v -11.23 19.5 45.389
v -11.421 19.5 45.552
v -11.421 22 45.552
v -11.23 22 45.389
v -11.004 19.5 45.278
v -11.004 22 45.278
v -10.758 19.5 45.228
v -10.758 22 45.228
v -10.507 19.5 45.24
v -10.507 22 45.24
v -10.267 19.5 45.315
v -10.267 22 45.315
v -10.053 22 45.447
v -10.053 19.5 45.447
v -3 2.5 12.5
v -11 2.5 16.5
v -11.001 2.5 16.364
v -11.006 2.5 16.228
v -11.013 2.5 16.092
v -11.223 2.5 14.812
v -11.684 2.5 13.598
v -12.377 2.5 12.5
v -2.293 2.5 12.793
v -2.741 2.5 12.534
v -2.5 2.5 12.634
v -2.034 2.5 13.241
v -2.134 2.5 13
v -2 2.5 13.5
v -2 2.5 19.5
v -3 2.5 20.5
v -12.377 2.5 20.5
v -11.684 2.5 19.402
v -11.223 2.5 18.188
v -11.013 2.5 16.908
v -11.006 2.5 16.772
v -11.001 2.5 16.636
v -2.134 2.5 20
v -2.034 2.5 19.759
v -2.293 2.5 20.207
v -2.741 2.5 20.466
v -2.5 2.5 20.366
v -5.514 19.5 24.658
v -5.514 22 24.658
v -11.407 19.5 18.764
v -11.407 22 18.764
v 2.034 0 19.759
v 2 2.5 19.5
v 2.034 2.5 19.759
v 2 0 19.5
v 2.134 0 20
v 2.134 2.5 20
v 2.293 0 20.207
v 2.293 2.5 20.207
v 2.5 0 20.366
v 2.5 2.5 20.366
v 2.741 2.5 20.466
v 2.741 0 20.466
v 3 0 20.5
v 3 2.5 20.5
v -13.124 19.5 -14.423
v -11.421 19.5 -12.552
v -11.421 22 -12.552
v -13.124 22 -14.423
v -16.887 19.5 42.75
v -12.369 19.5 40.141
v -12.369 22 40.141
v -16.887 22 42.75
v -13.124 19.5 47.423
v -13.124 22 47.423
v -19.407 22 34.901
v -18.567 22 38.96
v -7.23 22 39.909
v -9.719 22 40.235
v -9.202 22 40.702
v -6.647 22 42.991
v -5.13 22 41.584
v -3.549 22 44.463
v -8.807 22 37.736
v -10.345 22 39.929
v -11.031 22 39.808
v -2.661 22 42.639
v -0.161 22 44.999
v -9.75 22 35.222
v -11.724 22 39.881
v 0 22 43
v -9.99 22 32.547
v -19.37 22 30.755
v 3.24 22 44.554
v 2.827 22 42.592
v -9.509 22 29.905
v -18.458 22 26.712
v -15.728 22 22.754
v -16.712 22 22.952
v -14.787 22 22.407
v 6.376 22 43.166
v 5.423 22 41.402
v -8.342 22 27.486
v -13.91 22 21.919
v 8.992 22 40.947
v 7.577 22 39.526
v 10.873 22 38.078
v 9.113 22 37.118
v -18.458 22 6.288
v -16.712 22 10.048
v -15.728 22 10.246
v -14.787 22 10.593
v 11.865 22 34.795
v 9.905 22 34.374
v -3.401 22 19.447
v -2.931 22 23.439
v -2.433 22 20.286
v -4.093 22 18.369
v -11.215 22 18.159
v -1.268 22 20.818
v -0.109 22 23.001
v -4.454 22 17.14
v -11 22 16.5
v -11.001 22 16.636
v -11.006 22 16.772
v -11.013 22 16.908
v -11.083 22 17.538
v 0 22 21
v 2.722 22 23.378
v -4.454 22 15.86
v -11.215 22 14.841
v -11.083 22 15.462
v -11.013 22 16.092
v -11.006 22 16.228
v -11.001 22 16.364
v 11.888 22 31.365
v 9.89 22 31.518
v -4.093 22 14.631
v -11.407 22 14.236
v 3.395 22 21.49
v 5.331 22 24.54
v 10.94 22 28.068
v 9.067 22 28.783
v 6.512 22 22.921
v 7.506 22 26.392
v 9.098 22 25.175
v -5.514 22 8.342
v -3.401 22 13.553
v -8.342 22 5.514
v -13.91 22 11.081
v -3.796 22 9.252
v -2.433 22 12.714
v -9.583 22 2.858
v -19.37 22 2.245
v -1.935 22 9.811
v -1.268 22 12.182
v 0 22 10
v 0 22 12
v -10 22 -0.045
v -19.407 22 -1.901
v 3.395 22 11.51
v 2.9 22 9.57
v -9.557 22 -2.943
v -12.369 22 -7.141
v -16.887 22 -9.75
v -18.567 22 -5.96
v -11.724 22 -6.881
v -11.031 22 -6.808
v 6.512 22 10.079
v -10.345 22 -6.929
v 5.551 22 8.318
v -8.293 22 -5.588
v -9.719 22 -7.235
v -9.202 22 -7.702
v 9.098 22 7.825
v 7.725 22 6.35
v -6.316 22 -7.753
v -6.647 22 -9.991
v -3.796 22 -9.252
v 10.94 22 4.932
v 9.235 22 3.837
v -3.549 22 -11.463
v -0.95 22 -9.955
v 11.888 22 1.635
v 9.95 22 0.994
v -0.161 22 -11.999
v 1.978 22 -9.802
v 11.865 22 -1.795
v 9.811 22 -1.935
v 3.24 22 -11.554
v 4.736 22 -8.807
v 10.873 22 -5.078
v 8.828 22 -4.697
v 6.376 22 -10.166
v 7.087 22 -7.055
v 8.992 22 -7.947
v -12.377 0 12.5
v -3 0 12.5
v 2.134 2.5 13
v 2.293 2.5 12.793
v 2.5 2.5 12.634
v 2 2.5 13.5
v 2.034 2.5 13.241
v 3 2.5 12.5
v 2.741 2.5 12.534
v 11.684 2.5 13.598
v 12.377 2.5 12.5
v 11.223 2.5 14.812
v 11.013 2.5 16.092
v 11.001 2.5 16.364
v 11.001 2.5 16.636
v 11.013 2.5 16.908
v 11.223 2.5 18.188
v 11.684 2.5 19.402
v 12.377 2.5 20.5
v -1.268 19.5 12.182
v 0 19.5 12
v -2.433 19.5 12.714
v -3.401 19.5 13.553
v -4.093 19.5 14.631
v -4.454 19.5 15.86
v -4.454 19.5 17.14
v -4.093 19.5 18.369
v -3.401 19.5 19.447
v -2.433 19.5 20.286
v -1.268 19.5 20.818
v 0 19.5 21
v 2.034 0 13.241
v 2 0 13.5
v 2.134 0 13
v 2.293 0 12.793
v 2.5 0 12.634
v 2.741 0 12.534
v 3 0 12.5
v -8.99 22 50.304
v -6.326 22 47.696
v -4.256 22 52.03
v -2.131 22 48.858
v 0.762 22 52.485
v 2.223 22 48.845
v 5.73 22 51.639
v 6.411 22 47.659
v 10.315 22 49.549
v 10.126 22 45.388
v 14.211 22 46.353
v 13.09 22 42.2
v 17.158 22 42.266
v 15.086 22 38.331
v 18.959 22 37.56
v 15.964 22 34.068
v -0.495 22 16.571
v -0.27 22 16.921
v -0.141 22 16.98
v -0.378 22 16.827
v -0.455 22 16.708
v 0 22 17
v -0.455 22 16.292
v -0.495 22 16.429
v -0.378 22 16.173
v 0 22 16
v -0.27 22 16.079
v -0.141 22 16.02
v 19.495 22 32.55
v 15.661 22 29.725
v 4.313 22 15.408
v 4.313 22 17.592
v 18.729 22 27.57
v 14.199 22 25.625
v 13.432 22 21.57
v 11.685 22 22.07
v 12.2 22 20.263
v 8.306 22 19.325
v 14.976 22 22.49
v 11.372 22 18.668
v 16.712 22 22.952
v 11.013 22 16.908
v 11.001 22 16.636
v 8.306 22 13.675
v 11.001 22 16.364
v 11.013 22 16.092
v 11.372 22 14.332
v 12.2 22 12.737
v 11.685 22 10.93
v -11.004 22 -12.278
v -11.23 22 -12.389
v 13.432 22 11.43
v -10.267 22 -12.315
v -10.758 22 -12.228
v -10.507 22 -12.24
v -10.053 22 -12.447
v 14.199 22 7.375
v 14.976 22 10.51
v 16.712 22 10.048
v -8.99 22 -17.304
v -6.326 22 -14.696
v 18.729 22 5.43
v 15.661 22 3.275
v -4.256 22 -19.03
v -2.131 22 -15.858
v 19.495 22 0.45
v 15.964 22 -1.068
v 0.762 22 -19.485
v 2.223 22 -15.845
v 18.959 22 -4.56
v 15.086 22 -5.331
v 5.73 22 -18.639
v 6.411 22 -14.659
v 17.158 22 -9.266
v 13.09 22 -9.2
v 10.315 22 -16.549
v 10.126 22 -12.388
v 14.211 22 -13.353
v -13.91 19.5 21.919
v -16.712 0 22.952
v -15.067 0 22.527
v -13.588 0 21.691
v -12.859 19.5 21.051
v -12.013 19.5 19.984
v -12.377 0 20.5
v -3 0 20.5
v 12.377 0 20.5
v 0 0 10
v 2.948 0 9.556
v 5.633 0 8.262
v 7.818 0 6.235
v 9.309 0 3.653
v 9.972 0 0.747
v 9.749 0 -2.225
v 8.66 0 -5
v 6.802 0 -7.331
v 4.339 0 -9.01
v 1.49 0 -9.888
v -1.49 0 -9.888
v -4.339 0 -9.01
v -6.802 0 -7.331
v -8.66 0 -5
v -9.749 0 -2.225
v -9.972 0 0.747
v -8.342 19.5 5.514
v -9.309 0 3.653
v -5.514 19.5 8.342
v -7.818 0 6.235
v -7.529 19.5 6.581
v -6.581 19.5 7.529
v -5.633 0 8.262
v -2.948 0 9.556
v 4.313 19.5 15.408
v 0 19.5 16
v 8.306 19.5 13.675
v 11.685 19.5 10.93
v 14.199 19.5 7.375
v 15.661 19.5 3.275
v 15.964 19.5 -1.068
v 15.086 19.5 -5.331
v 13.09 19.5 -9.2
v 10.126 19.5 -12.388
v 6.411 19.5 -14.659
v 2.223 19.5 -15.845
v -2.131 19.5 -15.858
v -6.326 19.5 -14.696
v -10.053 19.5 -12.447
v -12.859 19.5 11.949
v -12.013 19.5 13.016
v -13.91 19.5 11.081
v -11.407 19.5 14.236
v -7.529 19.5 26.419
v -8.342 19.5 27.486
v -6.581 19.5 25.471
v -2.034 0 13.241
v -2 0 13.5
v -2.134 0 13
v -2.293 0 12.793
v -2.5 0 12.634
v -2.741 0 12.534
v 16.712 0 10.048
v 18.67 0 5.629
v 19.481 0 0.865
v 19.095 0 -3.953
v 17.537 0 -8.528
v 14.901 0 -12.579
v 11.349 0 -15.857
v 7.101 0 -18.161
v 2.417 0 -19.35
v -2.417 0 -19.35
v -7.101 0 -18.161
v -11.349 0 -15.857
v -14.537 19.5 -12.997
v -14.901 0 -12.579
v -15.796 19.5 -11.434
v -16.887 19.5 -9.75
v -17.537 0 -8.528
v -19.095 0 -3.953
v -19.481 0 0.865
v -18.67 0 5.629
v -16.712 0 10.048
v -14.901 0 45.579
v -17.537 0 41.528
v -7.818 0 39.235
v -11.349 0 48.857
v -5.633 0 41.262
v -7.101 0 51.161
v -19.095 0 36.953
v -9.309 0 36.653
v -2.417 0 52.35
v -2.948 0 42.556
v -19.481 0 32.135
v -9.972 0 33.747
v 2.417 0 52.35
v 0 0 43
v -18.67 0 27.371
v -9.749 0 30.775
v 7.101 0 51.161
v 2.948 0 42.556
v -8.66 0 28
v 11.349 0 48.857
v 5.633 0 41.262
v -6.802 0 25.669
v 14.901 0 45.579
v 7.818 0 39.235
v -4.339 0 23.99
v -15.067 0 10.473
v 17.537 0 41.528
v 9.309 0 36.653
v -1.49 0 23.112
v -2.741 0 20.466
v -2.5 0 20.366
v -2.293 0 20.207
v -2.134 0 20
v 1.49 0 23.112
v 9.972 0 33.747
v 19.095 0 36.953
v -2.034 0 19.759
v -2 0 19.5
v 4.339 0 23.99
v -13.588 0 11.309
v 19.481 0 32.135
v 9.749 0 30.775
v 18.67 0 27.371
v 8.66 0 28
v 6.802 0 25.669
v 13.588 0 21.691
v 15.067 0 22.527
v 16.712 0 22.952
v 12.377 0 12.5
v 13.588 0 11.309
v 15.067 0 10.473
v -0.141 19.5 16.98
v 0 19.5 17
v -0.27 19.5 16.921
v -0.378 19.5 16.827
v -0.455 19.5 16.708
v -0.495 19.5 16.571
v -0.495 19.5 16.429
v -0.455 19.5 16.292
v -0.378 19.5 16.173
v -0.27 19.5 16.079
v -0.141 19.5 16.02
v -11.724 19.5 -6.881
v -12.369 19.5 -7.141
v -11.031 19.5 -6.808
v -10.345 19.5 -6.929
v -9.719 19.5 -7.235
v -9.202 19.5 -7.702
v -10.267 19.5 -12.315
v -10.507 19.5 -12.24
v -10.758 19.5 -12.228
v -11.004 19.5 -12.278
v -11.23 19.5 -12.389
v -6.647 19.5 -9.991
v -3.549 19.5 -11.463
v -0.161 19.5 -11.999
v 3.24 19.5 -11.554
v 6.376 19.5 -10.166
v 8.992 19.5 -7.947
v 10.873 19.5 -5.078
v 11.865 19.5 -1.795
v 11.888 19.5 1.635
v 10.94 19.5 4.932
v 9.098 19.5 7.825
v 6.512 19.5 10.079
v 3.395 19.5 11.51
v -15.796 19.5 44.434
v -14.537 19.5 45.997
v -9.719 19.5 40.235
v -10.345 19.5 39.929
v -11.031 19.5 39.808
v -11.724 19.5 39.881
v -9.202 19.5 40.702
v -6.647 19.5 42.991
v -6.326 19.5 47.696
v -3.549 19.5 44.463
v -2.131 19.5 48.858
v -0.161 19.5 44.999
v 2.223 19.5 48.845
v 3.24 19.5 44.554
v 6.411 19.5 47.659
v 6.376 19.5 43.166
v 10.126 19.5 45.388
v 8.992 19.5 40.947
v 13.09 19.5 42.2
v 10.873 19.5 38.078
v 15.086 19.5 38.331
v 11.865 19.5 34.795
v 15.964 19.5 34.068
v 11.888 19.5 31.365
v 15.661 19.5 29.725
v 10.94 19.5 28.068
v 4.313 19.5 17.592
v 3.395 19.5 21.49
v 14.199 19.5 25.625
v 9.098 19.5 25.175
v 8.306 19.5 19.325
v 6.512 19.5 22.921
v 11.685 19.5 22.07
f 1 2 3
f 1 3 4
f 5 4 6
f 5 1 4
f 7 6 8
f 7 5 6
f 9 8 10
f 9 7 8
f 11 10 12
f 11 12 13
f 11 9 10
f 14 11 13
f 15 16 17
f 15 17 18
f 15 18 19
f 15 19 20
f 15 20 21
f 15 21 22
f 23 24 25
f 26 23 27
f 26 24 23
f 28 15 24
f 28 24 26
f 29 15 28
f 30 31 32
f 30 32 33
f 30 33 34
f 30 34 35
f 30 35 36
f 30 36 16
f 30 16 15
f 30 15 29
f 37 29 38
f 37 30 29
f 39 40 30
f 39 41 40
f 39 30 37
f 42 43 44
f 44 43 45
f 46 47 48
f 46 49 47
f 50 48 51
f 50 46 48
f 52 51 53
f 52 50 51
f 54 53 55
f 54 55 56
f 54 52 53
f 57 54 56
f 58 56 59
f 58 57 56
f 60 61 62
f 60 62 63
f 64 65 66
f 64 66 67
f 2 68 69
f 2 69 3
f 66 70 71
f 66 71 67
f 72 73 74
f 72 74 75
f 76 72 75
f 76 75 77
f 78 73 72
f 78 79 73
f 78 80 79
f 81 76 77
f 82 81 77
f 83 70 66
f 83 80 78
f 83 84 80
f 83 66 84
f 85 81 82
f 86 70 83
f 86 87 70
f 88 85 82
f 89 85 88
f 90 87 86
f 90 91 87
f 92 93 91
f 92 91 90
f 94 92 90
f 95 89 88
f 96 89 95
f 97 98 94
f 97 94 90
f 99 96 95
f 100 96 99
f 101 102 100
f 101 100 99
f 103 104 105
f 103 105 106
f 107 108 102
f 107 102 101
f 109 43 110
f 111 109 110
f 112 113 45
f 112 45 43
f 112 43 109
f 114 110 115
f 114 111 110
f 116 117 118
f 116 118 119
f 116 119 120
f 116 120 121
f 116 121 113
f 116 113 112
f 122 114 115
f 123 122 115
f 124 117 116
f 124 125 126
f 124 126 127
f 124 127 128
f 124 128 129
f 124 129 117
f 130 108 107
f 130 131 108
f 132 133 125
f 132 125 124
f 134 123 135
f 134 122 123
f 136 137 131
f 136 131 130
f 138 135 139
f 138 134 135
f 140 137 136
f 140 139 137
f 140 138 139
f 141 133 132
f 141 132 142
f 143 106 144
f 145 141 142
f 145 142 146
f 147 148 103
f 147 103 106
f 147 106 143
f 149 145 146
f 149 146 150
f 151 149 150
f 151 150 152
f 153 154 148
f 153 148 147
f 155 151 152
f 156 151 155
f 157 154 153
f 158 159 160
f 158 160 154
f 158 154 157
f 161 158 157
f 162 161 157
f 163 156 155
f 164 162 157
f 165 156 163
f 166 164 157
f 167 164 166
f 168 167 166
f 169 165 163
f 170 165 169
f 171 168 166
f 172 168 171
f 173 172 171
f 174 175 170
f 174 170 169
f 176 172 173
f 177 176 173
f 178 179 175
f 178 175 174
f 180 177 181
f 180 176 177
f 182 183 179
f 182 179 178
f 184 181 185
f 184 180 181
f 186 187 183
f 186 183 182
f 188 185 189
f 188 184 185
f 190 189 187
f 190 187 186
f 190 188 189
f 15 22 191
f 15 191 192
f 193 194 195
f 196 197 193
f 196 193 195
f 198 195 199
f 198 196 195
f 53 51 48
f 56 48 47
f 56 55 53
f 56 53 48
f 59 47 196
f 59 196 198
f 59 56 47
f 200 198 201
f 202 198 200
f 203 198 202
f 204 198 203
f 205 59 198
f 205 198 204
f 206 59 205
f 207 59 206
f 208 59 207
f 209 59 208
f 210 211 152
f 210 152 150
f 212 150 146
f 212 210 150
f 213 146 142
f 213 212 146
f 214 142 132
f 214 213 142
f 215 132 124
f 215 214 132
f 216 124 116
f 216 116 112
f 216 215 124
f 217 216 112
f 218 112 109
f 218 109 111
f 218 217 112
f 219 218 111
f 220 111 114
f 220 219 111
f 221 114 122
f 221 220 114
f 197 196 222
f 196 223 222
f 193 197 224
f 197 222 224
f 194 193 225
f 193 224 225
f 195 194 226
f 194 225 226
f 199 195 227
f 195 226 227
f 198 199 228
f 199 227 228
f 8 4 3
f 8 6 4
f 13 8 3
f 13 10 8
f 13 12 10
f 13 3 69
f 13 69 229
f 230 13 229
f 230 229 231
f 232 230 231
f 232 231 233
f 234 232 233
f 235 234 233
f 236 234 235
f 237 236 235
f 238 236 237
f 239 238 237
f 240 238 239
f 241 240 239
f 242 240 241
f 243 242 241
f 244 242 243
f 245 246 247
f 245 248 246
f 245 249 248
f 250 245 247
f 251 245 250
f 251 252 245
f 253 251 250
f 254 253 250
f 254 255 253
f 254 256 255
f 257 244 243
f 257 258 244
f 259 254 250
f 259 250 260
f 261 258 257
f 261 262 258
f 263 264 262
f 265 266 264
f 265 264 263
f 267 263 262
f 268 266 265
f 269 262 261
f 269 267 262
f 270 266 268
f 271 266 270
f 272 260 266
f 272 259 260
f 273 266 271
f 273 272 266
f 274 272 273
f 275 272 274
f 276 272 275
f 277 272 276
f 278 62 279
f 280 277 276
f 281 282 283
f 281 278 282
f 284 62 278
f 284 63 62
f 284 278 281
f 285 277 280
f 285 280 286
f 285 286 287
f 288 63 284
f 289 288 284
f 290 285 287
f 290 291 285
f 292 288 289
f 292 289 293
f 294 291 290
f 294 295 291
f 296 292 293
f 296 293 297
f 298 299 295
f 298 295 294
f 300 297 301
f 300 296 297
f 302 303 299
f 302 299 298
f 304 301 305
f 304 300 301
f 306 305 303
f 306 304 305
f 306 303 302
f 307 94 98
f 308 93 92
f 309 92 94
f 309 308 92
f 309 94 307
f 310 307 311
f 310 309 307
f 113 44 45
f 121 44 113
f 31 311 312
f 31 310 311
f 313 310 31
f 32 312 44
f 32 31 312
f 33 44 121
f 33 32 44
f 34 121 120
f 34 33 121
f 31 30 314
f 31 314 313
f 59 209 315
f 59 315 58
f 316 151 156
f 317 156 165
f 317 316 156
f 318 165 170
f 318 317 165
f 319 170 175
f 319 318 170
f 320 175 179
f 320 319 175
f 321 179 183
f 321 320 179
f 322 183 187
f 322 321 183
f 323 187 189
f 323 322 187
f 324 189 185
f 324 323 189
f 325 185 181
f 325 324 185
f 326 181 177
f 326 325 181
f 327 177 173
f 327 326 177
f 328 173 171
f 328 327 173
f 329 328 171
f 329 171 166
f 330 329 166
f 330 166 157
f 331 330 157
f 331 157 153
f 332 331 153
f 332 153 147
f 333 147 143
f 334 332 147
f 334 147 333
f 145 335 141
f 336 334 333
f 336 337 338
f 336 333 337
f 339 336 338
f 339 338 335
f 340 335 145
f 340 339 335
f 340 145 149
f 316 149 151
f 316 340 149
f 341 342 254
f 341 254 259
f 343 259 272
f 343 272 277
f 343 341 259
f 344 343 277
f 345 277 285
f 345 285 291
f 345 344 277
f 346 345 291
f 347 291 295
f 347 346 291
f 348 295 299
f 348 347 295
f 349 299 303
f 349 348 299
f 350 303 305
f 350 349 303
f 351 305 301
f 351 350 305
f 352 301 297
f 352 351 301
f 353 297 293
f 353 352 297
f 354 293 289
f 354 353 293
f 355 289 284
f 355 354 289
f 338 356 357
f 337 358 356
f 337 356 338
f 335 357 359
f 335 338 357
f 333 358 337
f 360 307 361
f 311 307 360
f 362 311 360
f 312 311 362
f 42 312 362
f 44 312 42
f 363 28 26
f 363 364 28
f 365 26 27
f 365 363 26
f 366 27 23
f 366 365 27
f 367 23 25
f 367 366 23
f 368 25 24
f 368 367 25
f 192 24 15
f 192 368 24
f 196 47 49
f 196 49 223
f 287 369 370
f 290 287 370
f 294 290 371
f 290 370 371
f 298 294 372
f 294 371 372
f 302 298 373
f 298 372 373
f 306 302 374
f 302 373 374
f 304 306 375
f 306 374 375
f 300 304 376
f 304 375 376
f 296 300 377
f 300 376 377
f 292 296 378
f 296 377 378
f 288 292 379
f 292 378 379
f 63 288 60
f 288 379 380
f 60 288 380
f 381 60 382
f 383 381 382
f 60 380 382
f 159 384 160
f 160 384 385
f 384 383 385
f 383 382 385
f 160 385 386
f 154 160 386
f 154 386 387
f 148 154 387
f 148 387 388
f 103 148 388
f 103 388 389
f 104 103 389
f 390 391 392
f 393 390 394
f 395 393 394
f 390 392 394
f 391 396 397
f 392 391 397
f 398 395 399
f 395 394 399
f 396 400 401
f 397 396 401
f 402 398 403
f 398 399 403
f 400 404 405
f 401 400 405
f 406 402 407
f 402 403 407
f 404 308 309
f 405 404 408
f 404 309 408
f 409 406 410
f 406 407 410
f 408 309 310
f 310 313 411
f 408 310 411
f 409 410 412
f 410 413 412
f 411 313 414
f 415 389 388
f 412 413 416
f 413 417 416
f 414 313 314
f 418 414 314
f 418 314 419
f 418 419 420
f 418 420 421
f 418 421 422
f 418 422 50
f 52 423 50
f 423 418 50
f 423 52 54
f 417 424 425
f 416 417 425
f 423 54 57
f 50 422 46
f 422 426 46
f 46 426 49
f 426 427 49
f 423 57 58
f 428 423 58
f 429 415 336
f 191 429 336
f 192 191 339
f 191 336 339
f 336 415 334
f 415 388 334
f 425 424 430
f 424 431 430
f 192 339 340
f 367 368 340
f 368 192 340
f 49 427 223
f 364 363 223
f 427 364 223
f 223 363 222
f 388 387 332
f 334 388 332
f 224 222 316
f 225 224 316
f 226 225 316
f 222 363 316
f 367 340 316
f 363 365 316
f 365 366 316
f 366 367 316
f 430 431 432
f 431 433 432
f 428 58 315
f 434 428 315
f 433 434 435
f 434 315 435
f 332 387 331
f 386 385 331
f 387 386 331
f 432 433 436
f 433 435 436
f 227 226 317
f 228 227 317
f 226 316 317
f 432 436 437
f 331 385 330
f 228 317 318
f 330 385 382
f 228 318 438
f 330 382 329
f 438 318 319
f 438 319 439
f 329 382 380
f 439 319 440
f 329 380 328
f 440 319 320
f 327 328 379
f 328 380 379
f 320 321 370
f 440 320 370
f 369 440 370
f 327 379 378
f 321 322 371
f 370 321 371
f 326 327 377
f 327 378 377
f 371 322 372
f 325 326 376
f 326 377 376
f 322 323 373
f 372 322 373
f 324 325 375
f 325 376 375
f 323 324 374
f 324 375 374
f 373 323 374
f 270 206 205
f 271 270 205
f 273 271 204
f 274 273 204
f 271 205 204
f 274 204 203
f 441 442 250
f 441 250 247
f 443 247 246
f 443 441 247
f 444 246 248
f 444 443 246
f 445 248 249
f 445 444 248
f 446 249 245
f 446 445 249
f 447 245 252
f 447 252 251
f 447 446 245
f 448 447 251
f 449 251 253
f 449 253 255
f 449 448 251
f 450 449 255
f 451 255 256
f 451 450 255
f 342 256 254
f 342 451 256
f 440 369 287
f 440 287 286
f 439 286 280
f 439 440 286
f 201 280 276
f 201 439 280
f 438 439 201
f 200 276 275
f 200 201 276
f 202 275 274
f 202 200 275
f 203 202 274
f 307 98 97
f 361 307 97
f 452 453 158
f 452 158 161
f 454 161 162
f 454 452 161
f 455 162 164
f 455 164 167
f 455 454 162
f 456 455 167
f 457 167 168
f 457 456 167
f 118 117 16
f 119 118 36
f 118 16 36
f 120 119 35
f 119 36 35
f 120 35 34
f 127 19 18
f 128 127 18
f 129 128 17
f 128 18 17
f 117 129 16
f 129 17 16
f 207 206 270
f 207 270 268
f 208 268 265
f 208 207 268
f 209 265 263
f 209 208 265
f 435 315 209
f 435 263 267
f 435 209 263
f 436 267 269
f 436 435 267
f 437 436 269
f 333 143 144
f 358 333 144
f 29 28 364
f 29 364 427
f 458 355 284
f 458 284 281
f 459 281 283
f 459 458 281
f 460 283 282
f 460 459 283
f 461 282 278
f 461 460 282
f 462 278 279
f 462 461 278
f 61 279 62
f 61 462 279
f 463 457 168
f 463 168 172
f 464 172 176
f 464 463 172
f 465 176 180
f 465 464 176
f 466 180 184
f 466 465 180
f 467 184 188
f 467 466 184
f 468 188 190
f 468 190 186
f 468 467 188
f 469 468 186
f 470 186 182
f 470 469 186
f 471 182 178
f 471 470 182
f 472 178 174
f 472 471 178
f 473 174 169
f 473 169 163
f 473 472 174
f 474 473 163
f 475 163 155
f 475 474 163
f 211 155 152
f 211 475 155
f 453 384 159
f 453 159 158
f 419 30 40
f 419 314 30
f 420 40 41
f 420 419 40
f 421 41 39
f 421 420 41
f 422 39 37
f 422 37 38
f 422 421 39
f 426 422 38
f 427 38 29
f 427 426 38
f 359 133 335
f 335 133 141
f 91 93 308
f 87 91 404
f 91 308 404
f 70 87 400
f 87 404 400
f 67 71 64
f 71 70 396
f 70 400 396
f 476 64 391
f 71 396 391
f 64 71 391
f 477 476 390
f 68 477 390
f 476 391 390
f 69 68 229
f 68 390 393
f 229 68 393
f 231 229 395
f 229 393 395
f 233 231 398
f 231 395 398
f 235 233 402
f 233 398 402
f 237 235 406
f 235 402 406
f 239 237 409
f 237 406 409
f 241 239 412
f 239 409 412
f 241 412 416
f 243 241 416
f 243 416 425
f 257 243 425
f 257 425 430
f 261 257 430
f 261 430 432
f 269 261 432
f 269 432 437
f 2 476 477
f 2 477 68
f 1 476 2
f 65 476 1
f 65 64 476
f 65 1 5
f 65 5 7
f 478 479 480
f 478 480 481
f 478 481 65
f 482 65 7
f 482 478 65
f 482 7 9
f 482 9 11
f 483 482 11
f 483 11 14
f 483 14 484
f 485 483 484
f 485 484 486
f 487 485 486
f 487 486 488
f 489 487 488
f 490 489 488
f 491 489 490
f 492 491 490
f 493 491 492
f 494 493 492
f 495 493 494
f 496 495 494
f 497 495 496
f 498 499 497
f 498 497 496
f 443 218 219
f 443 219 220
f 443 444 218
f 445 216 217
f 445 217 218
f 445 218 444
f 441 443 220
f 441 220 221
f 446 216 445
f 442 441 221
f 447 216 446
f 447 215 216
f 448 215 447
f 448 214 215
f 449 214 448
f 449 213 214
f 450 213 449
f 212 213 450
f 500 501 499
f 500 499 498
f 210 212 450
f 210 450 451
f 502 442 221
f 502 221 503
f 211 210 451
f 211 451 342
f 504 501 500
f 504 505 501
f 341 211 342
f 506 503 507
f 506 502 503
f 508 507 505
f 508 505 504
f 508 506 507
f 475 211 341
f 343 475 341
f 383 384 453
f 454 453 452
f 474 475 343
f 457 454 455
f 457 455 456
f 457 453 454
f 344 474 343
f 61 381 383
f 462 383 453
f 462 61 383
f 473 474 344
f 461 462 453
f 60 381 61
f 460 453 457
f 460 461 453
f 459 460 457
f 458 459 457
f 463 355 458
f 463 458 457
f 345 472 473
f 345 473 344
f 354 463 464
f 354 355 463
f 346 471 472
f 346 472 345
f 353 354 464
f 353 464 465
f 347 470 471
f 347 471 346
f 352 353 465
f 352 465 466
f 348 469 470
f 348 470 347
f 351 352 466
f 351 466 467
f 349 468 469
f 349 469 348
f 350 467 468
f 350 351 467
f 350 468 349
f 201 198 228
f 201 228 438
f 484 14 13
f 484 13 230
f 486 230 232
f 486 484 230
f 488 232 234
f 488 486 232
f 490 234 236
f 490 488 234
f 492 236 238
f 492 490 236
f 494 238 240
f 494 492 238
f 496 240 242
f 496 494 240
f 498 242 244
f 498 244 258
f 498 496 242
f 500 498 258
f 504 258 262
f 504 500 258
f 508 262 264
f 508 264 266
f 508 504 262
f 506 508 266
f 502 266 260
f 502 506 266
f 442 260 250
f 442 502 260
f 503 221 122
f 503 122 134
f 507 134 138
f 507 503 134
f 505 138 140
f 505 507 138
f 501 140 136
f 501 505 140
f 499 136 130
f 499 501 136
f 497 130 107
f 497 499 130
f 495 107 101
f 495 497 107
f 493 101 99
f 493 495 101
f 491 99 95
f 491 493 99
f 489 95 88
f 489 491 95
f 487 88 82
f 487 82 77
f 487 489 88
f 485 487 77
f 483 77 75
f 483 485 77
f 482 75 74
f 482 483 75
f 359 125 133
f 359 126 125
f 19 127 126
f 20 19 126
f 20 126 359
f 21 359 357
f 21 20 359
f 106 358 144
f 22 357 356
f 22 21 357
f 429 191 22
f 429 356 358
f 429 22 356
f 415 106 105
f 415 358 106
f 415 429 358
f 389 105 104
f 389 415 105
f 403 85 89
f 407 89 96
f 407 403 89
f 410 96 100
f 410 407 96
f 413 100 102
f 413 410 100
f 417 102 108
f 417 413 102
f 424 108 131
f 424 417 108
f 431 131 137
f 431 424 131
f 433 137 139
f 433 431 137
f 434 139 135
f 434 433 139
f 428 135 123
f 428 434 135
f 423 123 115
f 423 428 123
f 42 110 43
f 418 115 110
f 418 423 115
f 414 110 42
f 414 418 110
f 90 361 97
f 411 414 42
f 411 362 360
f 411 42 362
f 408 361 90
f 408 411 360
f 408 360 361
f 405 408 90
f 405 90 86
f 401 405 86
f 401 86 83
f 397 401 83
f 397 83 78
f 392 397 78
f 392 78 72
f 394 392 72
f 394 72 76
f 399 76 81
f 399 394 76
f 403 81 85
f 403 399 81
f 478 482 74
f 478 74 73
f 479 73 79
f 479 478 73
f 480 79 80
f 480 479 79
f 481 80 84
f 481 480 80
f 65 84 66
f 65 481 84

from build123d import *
from build123d.topology import SkipClean

# Parameters (mm, degrees)
SKETCH_1_R               = 19.5
EXTRUDE_1_DEPTH          = 22
CUT_EXTRUDE_1_DEPTH      = 61.170590823
CUT_EXTRUDE_1_DEPTH_BACK = 61.170590823
SKETCH_2_R               = 10
CUT_EXTRUDE_START        = -2.5
CUT_EXTRUDE_2_DEPTH      = 2.5
EXTRUDE_START            = -22
EXTRUDE_2_DEPTH          = 22
CUT_EXTRUDE_4_DEPTH      = 61.170590823
CUT_EXTRUDE_4_DEPTH_BACK = 61.170590823
SKETCH_5_R               = 6.5
CUT_EXTRUDE_5_DEPTH      = 2.5
FILLET_1_R               = 1
CUT_EXTRUDE_6_DEPTH      = 2.5


with BuildPart() as part:
    # 草图1 → 凸台-拉伸1 (new body)
    with BuildSketch(Plane(origin=(0, 0, 0), x_dir=(1, 0, 0), z_dir=(0, 1, 0))):
        Circle(SKETCH_1_R)
        with Locations((0, -33)):
            Circle(SKETCH_1_R)
    extrude(amount=EXTRUDE_1_DEPTH)

    # 草图2 → 切除-拉伸1 (cut, two sides: drawn at the far end of the back side and taken through both)
    with BuildSketch(Plane(origin=(0, 22, 0), x_dir=(1, 0, 0), z_dir=(0, 1, 0)).offset(-CUT_EXTRUDE_1_DEPTH_BACK)):
        with Locations(Location((0, 0, 0), (0, 0, 270))):
            Circle(SKETCH_2_R)
        with Locations(Location((0, -33, 0), (0, 0, 270))):
            Circle(SKETCH_2_R)
    extrude(amount=CUT_EXTRUDE_1_DEPTH + CUT_EXTRUDE_1_DEPTH_BACK, mode=Mode.SUBTRACT)

    # 草图3 → 切除-拉伸2 (cut)
    with BuildSketch(Plane(origin=(0, 22, 0), x_dir=(1, 0, 0), z_dir=(0, 1, 0)).offset(CUT_EXTRUDE_START)):
        with BuildLine():
            Line((-16.887495374, 9.75), (-12.369316877, 7.141428429))
            ThreePointArc((-12.369316877, 7.141428429), (-10.683653707, 6.844745078), (-9.202193277, 7.701924362))
            ThreePointArc((-9.202193277, 7.701924362), (10.872513333, 5.078233337), (0, -12))
            ThreePointArc((0, -12), (-4.5, -16.5), (0, -21))
            ThreePointArc((0, -21), (10.872513333, -38.078233337), (-9.202193277, -40.701924362))
            ThreePointArc((-9.202193277, -40.701924362), (-10.683653707, -39.844745078), (-12.369316877, -40.141428429))
            Line((-12.369316877, -40.141428429), (-16.887495374, -42.75))
            ThreePointArc((-16.887495374, -42.75), (-15.186446596, -45.232000645), (-13.123802868, -47.422752799))
            Line((-13.123802868, -47.422752799), (-11.421452311, -45.551909301))
            ThreePointArc((-11.421452311, -45.551909301), (-10.758297788, -45.227853244), (-10.053481376, -45.446988078))
            ThreePointArc((-10.053481376, -45.446988078), (15.085619133, -38.331425267), (0, -17))
            ThreePointArc((0, -17), (-0.5, -16.5), (0, -16))
            ThreePointArc((0, -16), (15.085619133, 5.331425267), (-10.053481376, 12.446988078))
            ThreePointArc((-10.053481376, 12.446988078), (-10.758297788, 12.227853244), (-11.421452311, 12.551909301))
            Line((-11.421452311, 12.551909301), (-13.123802868, 14.422752799))
            ThreePointArc((-13.123802868, 14.422752799), (-15.186446596, 12.232000645), (-16.887495374, 9.75))
        make_face()
    extrude(amount=CUT_EXTRUDE_2_DEPTH, mode=Mode.SUBTRACT)

    # 草图4 → 凸台-拉伸2 (add)
    with BuildSketch(Plane(origin=(0, 22, 0), x_dir=(1, 0, 0), z_dir=(0, 1, 0)).offset(EXTRUDE_START)):
        with BuildLine():
            ThreePointArc((11.012786163, -16.907500476), (11, -16.5), (11.012786163, -16.092499524))
            ThreePointArc((11.012786163, -16.092499524), (10.704484781, -16.299202605), (10.392304845, -16.5))
            ThreePointArc((10.392304845, -16.5), (10.704484781, -16.700797395), (11.012786163, -16.907500476))
        make_face()
        with BuildLine():
            ThreePointArc((-11.012786163, -16.092499524), (-11.003197327, -16.296149488), (-11, -16.5))
            ThreePointArc((-11, -16.5), (-11.003197327, -16.703850512), (-11.012786163, -16.907500476))
            ThreePointArc((-11.012786163, -16.907500476), (-10.704484781, -16.700797395), (-10.392304845, -16.5))
            ThreePointArc((-10.392304845, -16.5), (-10.704484781, -16.299202605), (-11.012786163, -16.092499524))
        make_face()
    extrude(amount=EXTRUDE_2_DEPTH)

    # 草图5 → 切除-拉伸4 (cut, two sides: drawn at the far end of the back side and taken through both)
    with SkipClean():  # the faces are left unmerged after this step: merging them gives an invalid solid
        with BuildSketch(Plane(origin=(0, 22, 0), x_dir=(1, 0, 0), z_dir=(0, 1, 0)).offset(-CUT_EXTRUDE_4_DEPTH_BACK)):
            with Locations((17.5, -16.5)):
                Circle(SKETCH_5_R)
            with Locations((-17.5, -16.5)):
                Circle(SKETCH_5_R)
        extrude(amount=CUT_EXTRUDE_4_DEPTH + CUT_EXTRUDE_4_DEPTH_BACK, mode=Mode.SUBTRACT)

    # 草图6 → 切除-拉伸5 (cut)
    with SkipClean():  # the faces are left unmerged after this step: merging them gives an invalid solid
        with BuildSketch(Plane.XZ.offset(CUT_EXTRUDE_START)):
            with BuildLine():
                Line((-12.376524617, 12.5), (-2, 12.5))
                Line((-2, 12.5), (-2, 20.5))
                Line((-2, 20.5), (-12.376524617, 20.5))
                ThreePointArc((-12.376524617, 20.5), (-11, 16.5), (-12.376524617, 12.5))
            make_face()
            with BuildLine():
                Line((2, 20.5), (2, 12.5))
                Line((2, 12.5), (12.376524617, 12.5))
                ThreePointArc((12.376524617, 12.5), (11, 16.5), (12.376524617, 20.5))
                Line((12.376524617, 20.5), (2, 20.5))
            make_face()
        extrude(amount=CUT_EXTRUDE_5_DEPTH, mode=Mode.SUBTRACT)

    # 圆角1
    fillet_1_edges = [part.edges().sort_by_distance(p)[0] for p in [
        (-2, 1.25, 20.5),
        (-2, 1.25, 12.5),
        (2, 1.25, 20.5),
        (2, 1.25, 12.5),
    ]]
    fillet(fillet_1_edges, radius=FILLET_1_R)

    # 草图7 → 切除-拉伸6 (cut)
    with SkipClean():  # the faces are left unmerged after this step: merging them gives an invalid solid
        with BuildSketch(Plane(origin=(0, 22, 0), x_dir=(1, 0, 0), z_dir=(0, 1, 0))):
            Polygon((-94.212388388, -97.040815513), (-15.085786438, -17.914213562), (1.414213562, -1.414213562), (-1.414213562, 1.414213562), (-17.914213562, -15.085786438), (-19.328427125, -16.5), (-15.503778834, -20.324648291), (-1.414213562, -34.414213562), (1.414213562, -31.585786438), (-13.671572875, -16.5), (-92.798174826, 62.62660195), (-316.593223793, 64.608809708), (-318.007437355, -95.058607756), align=None)
        extrude(amount=-CUT_EXTRUDE_6_DEPTH, mode=Mode.SUBTRACT)


solid = part.part
